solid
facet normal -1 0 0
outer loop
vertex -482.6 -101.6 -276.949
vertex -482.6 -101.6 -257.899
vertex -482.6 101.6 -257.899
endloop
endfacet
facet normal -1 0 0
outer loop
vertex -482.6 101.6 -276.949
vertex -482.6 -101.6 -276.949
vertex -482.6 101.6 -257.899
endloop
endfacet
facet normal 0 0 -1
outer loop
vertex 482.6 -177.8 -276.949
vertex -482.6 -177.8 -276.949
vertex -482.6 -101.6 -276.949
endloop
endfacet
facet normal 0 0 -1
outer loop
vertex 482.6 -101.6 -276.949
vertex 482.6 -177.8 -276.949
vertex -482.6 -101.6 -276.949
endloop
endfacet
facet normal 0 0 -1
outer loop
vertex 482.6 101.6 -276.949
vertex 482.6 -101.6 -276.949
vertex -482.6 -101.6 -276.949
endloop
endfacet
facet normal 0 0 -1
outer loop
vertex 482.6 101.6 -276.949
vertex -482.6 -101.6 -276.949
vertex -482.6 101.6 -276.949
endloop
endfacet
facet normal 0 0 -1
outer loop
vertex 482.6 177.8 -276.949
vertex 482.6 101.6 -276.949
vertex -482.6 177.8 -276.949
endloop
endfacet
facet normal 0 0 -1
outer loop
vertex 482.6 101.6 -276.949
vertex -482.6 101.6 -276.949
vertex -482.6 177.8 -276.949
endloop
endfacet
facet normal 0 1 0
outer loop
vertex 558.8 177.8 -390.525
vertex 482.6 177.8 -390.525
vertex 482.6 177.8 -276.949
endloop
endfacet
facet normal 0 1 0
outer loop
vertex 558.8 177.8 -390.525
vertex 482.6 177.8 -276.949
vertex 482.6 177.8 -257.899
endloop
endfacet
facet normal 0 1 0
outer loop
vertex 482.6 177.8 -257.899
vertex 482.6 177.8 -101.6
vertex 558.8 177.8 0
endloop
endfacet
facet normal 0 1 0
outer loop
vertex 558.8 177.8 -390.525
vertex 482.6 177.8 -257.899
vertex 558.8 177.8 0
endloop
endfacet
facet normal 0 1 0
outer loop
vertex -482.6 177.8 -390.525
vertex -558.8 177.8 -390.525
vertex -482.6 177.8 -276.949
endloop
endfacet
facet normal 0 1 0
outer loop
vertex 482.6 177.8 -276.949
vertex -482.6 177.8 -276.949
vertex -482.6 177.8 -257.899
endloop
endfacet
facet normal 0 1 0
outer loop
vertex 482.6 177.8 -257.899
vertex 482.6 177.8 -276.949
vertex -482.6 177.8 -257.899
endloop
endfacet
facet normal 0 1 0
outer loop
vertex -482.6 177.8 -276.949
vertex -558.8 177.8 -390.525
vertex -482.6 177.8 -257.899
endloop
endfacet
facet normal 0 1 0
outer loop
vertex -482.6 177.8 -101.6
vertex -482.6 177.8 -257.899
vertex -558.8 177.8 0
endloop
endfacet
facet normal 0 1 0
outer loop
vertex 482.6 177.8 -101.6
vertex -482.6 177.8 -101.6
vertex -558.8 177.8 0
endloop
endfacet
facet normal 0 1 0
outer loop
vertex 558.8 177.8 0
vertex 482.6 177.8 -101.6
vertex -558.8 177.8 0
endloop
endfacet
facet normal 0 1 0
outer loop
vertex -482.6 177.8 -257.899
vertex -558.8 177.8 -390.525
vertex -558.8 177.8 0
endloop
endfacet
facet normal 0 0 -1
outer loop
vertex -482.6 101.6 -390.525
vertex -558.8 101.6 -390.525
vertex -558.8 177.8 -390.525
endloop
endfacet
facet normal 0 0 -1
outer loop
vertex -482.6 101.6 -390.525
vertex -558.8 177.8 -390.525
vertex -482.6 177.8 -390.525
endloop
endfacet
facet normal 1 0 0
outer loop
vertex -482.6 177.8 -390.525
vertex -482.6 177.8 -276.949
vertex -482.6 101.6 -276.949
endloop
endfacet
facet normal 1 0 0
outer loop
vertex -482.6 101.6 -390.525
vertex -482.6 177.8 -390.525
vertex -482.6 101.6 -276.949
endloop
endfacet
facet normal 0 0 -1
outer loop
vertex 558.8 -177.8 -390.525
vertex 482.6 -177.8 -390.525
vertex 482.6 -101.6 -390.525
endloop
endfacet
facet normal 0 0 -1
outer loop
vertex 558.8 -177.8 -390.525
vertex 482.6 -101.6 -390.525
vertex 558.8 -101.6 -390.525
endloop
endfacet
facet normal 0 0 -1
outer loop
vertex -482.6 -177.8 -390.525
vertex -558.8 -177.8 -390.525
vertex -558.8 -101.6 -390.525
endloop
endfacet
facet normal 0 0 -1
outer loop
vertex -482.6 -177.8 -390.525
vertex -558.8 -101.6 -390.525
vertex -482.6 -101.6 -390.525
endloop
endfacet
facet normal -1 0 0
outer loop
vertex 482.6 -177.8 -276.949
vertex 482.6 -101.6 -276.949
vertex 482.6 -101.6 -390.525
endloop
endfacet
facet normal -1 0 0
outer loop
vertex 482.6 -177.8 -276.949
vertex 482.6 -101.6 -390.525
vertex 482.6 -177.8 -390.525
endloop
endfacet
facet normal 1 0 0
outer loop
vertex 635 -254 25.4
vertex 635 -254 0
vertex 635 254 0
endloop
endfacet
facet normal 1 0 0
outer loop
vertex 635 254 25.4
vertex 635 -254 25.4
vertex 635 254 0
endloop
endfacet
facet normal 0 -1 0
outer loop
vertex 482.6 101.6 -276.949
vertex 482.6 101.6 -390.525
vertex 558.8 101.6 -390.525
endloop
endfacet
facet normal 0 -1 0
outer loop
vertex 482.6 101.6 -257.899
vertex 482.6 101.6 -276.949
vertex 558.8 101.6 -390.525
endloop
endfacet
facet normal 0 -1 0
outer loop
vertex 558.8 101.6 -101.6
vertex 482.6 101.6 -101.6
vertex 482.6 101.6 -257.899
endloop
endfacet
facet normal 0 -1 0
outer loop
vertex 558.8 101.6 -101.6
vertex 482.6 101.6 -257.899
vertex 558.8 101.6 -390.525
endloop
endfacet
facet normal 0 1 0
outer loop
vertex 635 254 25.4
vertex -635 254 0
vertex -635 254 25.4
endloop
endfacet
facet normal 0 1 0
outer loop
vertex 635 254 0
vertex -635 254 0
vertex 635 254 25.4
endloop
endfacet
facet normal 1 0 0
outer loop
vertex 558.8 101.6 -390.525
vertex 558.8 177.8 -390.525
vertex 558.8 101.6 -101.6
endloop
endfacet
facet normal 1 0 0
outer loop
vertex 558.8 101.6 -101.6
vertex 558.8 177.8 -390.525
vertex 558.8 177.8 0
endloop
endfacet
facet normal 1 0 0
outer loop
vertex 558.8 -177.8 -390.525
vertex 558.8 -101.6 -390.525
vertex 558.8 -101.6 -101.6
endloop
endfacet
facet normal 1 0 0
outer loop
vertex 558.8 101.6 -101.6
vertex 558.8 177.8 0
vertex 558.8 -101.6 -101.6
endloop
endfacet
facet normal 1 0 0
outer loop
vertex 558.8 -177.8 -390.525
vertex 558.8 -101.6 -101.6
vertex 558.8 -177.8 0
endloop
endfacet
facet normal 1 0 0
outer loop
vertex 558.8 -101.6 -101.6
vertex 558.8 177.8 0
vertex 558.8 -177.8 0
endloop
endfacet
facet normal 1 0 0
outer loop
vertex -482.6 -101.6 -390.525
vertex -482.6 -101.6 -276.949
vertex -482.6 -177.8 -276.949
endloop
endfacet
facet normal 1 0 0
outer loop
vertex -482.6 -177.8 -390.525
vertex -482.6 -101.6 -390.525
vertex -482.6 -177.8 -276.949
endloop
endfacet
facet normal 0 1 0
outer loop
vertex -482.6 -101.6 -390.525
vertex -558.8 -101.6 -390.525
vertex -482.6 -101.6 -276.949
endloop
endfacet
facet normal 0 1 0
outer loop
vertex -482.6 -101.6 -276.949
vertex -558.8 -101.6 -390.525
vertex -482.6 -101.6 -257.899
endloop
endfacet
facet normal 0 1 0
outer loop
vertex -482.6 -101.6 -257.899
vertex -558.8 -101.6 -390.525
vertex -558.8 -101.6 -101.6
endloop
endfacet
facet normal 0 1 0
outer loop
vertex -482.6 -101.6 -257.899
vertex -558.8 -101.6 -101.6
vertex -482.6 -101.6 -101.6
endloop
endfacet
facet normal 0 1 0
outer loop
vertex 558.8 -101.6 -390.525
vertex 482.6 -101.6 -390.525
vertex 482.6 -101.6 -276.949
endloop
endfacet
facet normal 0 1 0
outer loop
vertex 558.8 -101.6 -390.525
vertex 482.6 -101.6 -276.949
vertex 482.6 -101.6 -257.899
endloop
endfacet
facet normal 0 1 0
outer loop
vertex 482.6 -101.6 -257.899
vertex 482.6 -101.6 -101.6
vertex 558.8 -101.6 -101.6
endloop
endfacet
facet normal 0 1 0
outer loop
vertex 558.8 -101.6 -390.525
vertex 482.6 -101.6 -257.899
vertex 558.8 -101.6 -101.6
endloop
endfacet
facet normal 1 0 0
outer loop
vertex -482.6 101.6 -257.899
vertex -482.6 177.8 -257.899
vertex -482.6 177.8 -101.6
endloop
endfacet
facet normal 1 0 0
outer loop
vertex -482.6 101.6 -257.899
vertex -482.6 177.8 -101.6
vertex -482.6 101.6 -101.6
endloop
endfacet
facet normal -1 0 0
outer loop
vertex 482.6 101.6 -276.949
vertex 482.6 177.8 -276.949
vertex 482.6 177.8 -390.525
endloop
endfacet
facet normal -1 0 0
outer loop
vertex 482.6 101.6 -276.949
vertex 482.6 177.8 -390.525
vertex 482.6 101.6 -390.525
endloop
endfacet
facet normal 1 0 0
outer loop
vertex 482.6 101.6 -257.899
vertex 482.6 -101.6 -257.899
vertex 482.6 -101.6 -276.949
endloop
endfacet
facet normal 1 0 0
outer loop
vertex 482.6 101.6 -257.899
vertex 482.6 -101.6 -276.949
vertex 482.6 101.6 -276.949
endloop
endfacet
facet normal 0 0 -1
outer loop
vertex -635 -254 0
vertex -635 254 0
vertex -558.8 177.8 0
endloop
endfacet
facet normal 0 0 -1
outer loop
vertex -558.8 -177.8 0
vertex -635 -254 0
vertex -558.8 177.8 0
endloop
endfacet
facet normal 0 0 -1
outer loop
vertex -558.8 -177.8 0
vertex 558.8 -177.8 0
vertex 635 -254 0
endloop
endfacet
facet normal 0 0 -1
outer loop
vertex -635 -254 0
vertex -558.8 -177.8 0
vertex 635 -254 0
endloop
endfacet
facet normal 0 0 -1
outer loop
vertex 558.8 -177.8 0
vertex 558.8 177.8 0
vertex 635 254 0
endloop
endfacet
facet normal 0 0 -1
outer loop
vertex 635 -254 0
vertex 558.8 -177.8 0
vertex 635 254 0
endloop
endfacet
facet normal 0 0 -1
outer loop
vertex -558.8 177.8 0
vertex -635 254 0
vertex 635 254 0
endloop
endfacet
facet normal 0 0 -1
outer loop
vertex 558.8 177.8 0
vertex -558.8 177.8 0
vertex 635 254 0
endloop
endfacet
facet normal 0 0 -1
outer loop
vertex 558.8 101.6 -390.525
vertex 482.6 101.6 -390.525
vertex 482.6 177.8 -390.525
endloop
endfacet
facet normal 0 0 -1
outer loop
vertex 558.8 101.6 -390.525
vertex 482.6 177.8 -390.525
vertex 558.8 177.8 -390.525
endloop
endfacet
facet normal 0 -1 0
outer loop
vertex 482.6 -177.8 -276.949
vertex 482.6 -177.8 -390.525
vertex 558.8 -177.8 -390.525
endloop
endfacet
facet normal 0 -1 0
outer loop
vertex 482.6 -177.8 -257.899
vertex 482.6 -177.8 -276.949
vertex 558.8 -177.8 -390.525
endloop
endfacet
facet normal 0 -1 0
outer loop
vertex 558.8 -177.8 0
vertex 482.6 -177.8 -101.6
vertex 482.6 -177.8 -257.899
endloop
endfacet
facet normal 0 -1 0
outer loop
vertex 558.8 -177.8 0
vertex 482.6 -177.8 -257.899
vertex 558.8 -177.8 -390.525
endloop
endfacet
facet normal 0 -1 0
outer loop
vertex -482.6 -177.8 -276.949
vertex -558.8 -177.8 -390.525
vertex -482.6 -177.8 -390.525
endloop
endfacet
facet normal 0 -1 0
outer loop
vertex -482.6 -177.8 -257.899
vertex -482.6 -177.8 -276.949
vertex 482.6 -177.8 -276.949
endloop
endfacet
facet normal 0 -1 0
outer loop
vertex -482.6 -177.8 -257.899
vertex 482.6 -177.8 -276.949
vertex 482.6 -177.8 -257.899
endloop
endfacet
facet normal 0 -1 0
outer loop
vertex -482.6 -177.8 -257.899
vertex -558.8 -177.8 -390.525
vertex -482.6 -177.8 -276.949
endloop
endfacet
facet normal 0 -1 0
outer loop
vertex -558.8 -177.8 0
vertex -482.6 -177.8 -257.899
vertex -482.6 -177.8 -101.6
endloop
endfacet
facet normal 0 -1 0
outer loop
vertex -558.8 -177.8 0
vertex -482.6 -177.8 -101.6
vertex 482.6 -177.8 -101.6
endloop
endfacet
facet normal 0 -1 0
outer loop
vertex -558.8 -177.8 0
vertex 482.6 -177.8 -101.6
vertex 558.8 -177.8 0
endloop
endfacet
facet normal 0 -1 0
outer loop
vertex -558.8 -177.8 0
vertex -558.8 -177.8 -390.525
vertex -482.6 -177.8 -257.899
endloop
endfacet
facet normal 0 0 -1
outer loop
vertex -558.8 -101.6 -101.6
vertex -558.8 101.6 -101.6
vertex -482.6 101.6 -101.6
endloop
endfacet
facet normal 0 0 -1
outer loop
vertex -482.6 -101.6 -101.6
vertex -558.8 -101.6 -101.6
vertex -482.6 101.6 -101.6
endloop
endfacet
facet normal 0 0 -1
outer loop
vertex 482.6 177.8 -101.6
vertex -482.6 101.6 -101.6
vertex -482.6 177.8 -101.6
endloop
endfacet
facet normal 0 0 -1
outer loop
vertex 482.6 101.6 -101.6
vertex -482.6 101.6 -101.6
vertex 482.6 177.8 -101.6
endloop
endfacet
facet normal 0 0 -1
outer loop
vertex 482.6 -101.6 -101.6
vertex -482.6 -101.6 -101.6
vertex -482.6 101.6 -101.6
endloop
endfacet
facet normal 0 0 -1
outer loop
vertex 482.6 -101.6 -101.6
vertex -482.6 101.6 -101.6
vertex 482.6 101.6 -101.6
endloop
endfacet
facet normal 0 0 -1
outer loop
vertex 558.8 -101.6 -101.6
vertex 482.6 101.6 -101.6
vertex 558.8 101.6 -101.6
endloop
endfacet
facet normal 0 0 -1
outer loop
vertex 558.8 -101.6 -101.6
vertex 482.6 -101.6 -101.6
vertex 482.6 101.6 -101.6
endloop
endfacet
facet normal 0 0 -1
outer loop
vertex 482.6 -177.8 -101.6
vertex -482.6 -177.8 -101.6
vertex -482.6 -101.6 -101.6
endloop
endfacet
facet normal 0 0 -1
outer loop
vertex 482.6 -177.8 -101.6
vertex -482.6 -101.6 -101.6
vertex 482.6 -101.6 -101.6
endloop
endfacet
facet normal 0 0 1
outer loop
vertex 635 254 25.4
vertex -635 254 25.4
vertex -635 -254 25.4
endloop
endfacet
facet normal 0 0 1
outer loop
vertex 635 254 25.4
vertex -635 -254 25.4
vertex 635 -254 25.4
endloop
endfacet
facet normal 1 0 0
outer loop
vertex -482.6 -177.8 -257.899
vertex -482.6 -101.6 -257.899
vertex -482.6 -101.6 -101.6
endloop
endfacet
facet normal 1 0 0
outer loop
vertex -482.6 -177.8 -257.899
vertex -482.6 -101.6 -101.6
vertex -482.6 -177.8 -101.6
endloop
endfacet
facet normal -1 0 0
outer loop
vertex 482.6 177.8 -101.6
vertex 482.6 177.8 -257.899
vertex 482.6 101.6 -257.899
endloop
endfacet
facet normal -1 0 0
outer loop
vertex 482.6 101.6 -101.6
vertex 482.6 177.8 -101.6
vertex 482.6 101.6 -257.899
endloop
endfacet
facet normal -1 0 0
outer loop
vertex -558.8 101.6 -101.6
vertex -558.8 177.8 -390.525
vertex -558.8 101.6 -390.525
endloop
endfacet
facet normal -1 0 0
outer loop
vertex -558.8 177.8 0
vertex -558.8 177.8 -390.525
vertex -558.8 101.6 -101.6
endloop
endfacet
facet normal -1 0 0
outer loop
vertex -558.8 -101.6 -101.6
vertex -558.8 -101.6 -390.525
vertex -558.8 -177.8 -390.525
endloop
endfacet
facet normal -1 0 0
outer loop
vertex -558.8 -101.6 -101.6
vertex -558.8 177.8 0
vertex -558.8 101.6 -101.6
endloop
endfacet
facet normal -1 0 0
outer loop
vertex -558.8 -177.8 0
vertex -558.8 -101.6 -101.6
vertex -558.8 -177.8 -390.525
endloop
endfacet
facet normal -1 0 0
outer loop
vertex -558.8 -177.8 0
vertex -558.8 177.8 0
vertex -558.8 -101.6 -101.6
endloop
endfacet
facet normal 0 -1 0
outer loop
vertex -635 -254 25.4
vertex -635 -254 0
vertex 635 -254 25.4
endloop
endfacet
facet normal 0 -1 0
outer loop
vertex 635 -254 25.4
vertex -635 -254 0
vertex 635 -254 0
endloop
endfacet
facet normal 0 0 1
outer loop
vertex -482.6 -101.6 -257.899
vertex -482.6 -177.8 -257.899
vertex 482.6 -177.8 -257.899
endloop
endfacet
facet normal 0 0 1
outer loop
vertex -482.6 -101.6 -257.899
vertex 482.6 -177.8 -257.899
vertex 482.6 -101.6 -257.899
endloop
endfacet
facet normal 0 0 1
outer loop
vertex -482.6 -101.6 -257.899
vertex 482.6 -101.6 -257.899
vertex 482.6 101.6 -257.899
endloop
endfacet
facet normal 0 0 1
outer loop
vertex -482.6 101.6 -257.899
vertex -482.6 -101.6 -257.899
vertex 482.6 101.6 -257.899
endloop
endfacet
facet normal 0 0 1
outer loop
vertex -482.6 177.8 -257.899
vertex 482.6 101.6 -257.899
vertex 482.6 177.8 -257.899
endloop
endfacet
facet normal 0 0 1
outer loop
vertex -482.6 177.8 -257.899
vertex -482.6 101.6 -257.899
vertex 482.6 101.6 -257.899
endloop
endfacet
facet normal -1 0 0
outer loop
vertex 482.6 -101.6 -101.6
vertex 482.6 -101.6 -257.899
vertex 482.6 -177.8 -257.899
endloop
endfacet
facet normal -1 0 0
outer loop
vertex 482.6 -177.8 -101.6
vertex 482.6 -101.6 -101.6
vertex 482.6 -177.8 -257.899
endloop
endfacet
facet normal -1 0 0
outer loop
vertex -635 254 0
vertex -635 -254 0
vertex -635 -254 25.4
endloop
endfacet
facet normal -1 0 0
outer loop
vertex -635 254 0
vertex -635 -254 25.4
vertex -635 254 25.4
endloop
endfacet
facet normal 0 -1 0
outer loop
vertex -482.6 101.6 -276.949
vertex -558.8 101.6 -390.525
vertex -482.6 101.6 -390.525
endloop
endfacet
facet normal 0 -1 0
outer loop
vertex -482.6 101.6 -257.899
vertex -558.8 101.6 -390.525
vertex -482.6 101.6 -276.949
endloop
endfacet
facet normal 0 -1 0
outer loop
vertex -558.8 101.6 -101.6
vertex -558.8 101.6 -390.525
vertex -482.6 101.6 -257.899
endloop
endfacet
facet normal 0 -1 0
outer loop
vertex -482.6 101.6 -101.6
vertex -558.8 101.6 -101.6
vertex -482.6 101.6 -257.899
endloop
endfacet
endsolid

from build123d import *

# Parameters (mm, degrees)
F0_W     = 1270
F0_H     = 508
F1_DEPTH = 25.4
F2_W     = 1117.6
F2_H     = 355.6
F3_DEPTH = 101.6
F4_W     = 76.2
F4_H     = 76.2
F5_DEPTH = 288.925
F6_W     = 355.6
F6_H     = 19.05
F7_DEPTH = 965.2


with BuildPart() as f1:
    # F0 (on Top) → F1 (new body)
    with BuildSketch(Plane.XY):
        Rectangle(F0_W, F0_H)
    extrude(amount=F1_DEPTH)

    # F2 (on face) → F3 (join)
    with BuildSketch(Plane(origin=(0, 0, 0), x_dir=(1, 0, 0), z_dir=(0, 0, -1))):
        Rectangle(F2_W, F2_H)
    extrude(amount=F3_DEPTH)

    # F4 (on face) → F5 (join)
    with BuildSketch(Plane(origin=(0, 0, -101.6), x_dir=(1, 0, 0), z_dir=(0, 0, -1))):
        with Locations((-520.7, 139.7)):
            Rectangle(F4_W, F4_H)
        with Locations((-520.7, -139.7)):
            Rectangle(F4_W, F4_H)
        with Locations((520.7, 139.7)):
            Rectangle(F4_W, F4_H)
        with Locations((520.7, -139.7)):
            Rectangle(F4_W, F4_H)
    extrude(amount=F5_DEPTH)

    # F6 (on face) → F7 (join, through all)
    with BuildSketch(Plane.YZ.offset(-482.6)):
        with Locations((0, -267.423869)):
            Rectangle(F6_W, F6_H)
    extrude(amount=F7_DEPTH)


solid = f1.part
